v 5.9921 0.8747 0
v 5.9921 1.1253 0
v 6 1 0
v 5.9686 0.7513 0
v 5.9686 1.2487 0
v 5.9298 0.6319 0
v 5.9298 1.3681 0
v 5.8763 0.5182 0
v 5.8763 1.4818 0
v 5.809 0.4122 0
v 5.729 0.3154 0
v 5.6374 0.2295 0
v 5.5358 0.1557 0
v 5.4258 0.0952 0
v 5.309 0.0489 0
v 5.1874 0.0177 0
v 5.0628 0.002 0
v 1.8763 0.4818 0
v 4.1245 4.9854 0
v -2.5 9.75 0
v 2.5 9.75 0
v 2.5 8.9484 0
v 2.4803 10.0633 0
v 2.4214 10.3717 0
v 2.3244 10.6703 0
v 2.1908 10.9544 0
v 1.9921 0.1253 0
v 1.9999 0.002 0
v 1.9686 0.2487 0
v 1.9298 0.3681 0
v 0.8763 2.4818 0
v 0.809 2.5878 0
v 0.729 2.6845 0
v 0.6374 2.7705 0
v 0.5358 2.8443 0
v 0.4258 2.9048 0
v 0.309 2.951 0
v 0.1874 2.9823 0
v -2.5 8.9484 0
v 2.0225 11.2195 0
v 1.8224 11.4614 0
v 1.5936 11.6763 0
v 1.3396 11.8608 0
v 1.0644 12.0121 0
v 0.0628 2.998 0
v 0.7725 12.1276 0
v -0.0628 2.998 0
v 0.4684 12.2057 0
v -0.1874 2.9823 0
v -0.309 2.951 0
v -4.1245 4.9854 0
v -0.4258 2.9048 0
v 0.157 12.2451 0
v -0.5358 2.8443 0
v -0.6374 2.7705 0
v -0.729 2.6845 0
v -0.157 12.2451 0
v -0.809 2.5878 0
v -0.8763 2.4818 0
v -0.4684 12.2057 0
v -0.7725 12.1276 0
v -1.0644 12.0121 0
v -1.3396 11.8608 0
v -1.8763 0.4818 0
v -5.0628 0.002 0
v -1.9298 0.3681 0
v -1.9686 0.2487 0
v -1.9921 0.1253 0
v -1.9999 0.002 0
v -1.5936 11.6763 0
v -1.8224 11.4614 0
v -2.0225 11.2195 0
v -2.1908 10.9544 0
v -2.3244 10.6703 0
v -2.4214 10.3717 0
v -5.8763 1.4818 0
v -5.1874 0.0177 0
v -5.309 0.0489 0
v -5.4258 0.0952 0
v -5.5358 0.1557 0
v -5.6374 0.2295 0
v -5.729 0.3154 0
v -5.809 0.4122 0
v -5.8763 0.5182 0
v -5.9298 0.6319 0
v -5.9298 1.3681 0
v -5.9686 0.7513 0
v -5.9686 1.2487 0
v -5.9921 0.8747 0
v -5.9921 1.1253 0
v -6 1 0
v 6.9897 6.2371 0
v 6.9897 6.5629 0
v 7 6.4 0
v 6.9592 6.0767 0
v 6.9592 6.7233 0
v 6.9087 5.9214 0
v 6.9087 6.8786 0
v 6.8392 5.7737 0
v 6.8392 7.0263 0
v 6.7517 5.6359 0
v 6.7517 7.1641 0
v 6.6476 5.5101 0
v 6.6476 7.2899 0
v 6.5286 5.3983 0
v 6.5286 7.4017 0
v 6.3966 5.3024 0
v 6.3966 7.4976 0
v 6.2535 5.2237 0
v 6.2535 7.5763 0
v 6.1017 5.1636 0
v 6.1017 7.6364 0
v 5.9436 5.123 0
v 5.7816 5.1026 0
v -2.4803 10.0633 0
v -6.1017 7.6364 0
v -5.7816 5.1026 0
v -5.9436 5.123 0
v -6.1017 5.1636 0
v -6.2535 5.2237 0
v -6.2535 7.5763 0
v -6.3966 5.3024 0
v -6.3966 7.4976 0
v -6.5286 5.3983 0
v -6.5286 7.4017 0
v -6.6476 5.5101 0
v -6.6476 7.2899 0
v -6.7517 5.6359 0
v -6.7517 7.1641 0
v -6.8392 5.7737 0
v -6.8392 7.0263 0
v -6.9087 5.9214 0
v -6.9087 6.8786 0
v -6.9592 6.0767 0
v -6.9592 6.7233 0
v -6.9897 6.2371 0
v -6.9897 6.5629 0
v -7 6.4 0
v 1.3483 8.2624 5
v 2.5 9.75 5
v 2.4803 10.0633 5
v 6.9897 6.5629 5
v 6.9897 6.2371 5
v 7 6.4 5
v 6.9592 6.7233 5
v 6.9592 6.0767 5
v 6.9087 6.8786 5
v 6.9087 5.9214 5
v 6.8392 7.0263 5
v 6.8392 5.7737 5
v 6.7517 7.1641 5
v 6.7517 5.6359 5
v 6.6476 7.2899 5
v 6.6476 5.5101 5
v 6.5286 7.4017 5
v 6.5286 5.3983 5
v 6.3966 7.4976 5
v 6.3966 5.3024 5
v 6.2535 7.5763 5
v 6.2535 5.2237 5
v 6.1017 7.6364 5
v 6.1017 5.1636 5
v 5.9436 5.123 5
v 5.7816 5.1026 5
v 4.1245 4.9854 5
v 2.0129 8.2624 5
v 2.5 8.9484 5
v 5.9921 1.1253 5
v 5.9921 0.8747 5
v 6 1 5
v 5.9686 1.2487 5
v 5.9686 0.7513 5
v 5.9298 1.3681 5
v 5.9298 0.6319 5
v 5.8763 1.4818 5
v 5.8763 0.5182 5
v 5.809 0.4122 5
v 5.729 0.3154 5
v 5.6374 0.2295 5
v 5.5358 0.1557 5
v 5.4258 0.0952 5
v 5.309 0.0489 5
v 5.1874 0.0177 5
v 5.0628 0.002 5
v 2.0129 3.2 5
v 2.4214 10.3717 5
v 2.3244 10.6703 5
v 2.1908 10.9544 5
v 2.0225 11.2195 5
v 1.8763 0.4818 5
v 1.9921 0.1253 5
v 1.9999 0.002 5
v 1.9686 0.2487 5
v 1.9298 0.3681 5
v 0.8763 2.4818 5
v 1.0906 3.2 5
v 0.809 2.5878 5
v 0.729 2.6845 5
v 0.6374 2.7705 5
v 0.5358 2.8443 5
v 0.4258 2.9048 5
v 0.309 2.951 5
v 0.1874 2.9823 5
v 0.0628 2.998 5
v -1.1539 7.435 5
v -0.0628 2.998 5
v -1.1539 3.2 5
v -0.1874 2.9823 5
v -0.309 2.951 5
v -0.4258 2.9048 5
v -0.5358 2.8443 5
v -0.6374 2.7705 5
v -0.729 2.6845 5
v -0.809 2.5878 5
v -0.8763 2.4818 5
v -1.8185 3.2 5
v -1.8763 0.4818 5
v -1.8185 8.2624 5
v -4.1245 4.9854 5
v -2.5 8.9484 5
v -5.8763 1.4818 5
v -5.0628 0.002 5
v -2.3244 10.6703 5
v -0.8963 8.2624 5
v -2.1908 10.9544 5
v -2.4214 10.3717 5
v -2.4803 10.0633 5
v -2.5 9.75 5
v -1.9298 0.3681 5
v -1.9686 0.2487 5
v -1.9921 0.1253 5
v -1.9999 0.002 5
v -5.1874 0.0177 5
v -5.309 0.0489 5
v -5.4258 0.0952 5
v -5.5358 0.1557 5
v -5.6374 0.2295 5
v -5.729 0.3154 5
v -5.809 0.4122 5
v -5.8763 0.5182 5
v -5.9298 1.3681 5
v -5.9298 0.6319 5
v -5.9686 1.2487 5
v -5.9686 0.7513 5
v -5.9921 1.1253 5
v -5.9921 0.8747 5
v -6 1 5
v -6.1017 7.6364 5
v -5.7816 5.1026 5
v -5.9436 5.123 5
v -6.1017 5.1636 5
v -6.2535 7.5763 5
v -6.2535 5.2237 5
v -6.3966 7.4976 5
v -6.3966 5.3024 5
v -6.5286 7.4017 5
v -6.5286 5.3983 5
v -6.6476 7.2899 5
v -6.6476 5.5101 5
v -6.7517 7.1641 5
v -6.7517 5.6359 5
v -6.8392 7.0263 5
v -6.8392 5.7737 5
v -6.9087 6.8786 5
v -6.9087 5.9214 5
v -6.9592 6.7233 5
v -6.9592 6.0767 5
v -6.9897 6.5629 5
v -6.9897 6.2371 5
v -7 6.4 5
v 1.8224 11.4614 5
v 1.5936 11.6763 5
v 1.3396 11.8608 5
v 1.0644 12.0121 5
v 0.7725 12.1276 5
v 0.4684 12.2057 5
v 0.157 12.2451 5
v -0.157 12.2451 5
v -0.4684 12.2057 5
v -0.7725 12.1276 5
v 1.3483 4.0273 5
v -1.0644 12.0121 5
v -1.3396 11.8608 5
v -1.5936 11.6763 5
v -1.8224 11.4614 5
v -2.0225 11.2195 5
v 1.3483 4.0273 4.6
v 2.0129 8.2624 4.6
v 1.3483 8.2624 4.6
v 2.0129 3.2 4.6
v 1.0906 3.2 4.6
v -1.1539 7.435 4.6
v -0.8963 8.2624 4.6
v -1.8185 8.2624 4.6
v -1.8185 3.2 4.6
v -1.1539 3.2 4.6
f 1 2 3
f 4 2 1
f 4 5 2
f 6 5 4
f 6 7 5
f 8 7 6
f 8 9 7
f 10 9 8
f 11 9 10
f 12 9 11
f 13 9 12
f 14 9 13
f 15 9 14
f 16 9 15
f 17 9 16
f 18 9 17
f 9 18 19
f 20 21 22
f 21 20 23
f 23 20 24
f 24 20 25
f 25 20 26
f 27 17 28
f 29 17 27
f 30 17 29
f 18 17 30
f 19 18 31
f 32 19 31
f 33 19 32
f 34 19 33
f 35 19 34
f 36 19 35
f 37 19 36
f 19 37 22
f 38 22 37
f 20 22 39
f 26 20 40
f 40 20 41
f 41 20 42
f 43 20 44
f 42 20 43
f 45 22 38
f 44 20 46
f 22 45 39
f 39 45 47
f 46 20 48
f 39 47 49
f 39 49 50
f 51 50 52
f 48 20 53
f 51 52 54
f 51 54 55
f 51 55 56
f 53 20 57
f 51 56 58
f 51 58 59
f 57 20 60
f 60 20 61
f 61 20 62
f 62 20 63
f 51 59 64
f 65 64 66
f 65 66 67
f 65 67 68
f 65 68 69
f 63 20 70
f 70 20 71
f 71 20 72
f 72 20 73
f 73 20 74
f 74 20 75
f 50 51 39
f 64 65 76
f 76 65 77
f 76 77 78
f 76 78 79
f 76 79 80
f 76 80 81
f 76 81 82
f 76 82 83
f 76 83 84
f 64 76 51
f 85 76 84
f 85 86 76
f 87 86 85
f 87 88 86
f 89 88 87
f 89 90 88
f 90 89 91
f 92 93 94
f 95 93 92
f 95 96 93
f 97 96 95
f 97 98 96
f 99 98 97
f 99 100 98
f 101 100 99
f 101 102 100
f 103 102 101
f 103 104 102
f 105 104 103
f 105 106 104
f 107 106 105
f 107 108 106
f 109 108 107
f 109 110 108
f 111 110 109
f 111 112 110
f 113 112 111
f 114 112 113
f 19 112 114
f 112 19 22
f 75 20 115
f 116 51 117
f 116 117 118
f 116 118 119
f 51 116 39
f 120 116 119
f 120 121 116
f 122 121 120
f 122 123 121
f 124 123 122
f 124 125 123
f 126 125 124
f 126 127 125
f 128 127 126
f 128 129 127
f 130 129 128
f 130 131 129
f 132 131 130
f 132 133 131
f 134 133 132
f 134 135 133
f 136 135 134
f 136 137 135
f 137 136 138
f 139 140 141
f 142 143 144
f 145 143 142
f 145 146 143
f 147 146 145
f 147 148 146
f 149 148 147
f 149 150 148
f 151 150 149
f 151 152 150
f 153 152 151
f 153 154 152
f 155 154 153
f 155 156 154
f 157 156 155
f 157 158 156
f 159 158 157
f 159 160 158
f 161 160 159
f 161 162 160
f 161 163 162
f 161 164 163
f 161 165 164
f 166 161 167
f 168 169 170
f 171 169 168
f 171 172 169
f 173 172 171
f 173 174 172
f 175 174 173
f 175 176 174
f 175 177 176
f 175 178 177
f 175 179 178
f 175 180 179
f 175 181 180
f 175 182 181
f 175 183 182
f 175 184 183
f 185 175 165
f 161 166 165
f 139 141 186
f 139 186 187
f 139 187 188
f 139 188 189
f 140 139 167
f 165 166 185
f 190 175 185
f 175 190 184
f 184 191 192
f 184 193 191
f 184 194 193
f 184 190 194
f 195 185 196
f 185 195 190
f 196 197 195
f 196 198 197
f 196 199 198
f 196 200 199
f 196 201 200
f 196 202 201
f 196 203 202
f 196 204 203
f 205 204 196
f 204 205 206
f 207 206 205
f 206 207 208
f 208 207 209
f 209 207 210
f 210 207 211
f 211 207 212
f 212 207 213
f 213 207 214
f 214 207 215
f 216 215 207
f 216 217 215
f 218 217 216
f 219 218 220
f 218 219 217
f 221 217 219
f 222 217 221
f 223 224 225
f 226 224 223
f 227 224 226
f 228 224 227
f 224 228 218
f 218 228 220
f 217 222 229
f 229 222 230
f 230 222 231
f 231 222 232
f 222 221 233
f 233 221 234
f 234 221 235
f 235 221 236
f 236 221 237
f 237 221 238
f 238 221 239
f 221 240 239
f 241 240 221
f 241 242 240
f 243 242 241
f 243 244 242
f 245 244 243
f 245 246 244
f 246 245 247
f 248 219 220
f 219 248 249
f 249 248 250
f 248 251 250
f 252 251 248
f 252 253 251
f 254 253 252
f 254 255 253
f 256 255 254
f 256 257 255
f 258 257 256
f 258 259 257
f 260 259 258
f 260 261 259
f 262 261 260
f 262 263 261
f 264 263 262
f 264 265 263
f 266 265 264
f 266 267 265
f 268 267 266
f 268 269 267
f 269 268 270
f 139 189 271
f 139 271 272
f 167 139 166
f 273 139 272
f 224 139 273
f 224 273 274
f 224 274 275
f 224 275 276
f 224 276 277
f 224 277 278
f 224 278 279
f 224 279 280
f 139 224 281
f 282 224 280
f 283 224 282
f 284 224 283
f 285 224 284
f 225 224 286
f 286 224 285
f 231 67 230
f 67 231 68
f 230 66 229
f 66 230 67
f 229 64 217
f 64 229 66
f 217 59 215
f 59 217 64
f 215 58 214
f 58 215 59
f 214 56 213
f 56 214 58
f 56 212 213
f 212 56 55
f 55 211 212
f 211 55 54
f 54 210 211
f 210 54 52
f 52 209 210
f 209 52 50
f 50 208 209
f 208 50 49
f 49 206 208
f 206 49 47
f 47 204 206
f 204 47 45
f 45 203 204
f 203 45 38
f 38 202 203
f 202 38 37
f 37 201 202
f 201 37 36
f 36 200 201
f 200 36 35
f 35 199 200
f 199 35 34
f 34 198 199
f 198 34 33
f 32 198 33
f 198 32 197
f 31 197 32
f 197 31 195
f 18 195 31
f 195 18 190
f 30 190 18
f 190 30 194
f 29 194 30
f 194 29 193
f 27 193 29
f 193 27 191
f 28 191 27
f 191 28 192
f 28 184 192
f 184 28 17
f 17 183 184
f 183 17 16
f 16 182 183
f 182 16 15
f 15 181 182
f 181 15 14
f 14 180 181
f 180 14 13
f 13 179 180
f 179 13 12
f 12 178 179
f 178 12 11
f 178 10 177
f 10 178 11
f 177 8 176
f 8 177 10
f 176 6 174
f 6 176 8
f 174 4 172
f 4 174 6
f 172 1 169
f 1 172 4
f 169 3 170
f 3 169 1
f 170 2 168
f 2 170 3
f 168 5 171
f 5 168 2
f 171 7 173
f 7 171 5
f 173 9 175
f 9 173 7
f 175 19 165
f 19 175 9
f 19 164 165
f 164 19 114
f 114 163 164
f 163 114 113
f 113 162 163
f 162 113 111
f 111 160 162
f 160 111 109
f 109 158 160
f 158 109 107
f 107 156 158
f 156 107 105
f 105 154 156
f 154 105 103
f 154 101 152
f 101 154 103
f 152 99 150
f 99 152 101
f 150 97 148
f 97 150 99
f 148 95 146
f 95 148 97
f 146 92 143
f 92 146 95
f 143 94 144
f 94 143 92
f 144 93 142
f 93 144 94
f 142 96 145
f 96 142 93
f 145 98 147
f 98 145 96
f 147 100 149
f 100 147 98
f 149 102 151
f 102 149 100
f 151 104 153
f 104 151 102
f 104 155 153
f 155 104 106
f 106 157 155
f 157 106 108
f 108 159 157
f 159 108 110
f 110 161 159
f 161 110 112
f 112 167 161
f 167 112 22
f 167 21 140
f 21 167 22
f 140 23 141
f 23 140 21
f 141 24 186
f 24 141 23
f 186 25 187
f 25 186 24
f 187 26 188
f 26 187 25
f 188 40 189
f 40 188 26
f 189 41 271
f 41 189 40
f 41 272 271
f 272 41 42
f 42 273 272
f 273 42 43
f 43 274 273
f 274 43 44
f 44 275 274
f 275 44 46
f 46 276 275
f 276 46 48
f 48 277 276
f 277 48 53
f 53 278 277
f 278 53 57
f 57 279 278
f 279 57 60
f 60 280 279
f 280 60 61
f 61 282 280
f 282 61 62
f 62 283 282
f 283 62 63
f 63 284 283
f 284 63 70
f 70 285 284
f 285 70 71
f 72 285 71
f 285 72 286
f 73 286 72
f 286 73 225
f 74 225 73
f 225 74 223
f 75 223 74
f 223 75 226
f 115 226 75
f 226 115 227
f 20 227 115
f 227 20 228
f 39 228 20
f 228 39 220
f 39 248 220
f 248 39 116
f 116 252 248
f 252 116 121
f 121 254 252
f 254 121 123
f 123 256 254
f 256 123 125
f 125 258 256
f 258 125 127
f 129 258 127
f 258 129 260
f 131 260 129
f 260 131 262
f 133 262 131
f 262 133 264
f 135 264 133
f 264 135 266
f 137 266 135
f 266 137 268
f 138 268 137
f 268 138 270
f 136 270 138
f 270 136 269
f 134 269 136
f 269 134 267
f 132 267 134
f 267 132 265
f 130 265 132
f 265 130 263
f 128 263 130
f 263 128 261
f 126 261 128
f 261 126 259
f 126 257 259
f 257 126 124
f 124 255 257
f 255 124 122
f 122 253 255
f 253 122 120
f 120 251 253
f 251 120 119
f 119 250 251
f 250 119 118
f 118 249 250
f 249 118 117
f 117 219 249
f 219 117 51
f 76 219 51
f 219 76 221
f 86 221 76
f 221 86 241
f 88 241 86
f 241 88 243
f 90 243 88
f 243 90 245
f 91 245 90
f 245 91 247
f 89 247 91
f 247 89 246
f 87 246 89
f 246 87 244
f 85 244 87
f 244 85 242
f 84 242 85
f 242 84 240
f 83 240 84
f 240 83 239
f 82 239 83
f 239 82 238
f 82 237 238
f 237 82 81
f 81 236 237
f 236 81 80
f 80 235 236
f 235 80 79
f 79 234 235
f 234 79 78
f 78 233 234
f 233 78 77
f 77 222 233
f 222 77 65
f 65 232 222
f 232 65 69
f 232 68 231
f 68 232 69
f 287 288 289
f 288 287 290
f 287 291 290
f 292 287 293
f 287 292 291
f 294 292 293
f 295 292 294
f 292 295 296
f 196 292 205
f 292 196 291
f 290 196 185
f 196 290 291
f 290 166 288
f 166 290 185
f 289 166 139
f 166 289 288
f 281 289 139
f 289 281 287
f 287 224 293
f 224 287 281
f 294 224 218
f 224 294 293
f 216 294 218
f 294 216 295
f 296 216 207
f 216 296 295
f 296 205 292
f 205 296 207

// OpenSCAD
// author: clayb.rpi@gmail.com
// date: 2012-05-05
// units: mm
// description: a meeple character for games

LEG_WIDTH = 12;
ARM_WIDTH = 14;
HEIGHT = 16;
MEEPLE_THICKNESS = 5;
HEAD_DIAM = 5;
HEAD_POSITION = HEAD_DIAM * 1.25;
ROUNDED_RADIUS = 1;
FOOT_CUTOUT_RADIUS = 4;
HAND_RADIUS = 1.3;
SHOULDER_POSITION = HEIGHT * 0.45;
HAND_POSITION = HEIGHT * 0.4;

LETTER_THICKNESS = 0.4;
LETTER_SIZE = 5;
LETTER = "N";
FONT = "Comic Sans MS";

$fn=50;

module meeple_2d() {
  // head
  hull() {
    // Top
    translate([0, HEIGHT - HEAD_POSITION])
    circle(r=HEAD_DIAM / 2);
    // Bottom
    translate([0, HEIGHT - 1.5*HEAD_POSITION])
    circle(r=HEAD_DIAM / 2);
  }

  // body
  difference() {
    hull() {
      // Top
      translate([0, HEIGHT - HEAD_DIAM])
      circle(r=ROUNDED_RADIUS);
      // Left
      translate([-(LEG_WIDTH /2 - ROUNDED_RADIUS), ROUNDED_RADIUS])
      circle(r=ROUNDED_RADIUS);
      // Right
      translate([LEG_WIDTH /2 - ROUNDED_RADIUS, ROUNDED_RADIUS])
      circle(r=ROUNDED_RADIUS);
    }

    // foot cutout
    hull() {
      // Top
      translate([0, FOOT_CUTOUT_RADIUS /2])
      circle(r=ROUNDED_RADIUS);
      // Left
      translate([-(FOOT_CUTOUT_RADIUS /2 - ROUNDED_RADIUS), 0])
      circle(r=ROUNDED_RADIUS);
      // Right
      translate([FOOT_CUTOUT_RADIUS /2 - ROUNDED_RADIUS, 0])
      circle(r=ROUNDED_RADIUS);
    }
  }

  // arms
  hull() {
    // Top
    translate([0, SHOULDER_POSITION])
    circle(r=HEAD_DIAM / 2);
    // Left
    translate([-ARM_WIDTH / 2 + HAND_RADIUS, HAND_POSITION])
    circle(r=HAND_RADIUS);
  }
  hull() {
    // Top
    translate([0, SHOULDER_POSITION])
    circle(r=HEAD_DIAM / 2);
    // Right
    translate([ARM_WIDTH / 2 - HAND_RADIUS, HAND_POSITION])
    circle(r=HAND_RADIUS);
  }
}

difference() {
  linear_extrude(height=MEEPLE_THICKNESS)
  meeple_2d();

  translate([-LETTER_SIZE/2, HEIGHT*0.2, MEEPLE_THICKNESS-LETTER_THICKNESS])
  linear_extrude(height=2*LETTER_THICKNESS)
  text(LETTER, size=LETTER_SIZE, font=FONT);
}
